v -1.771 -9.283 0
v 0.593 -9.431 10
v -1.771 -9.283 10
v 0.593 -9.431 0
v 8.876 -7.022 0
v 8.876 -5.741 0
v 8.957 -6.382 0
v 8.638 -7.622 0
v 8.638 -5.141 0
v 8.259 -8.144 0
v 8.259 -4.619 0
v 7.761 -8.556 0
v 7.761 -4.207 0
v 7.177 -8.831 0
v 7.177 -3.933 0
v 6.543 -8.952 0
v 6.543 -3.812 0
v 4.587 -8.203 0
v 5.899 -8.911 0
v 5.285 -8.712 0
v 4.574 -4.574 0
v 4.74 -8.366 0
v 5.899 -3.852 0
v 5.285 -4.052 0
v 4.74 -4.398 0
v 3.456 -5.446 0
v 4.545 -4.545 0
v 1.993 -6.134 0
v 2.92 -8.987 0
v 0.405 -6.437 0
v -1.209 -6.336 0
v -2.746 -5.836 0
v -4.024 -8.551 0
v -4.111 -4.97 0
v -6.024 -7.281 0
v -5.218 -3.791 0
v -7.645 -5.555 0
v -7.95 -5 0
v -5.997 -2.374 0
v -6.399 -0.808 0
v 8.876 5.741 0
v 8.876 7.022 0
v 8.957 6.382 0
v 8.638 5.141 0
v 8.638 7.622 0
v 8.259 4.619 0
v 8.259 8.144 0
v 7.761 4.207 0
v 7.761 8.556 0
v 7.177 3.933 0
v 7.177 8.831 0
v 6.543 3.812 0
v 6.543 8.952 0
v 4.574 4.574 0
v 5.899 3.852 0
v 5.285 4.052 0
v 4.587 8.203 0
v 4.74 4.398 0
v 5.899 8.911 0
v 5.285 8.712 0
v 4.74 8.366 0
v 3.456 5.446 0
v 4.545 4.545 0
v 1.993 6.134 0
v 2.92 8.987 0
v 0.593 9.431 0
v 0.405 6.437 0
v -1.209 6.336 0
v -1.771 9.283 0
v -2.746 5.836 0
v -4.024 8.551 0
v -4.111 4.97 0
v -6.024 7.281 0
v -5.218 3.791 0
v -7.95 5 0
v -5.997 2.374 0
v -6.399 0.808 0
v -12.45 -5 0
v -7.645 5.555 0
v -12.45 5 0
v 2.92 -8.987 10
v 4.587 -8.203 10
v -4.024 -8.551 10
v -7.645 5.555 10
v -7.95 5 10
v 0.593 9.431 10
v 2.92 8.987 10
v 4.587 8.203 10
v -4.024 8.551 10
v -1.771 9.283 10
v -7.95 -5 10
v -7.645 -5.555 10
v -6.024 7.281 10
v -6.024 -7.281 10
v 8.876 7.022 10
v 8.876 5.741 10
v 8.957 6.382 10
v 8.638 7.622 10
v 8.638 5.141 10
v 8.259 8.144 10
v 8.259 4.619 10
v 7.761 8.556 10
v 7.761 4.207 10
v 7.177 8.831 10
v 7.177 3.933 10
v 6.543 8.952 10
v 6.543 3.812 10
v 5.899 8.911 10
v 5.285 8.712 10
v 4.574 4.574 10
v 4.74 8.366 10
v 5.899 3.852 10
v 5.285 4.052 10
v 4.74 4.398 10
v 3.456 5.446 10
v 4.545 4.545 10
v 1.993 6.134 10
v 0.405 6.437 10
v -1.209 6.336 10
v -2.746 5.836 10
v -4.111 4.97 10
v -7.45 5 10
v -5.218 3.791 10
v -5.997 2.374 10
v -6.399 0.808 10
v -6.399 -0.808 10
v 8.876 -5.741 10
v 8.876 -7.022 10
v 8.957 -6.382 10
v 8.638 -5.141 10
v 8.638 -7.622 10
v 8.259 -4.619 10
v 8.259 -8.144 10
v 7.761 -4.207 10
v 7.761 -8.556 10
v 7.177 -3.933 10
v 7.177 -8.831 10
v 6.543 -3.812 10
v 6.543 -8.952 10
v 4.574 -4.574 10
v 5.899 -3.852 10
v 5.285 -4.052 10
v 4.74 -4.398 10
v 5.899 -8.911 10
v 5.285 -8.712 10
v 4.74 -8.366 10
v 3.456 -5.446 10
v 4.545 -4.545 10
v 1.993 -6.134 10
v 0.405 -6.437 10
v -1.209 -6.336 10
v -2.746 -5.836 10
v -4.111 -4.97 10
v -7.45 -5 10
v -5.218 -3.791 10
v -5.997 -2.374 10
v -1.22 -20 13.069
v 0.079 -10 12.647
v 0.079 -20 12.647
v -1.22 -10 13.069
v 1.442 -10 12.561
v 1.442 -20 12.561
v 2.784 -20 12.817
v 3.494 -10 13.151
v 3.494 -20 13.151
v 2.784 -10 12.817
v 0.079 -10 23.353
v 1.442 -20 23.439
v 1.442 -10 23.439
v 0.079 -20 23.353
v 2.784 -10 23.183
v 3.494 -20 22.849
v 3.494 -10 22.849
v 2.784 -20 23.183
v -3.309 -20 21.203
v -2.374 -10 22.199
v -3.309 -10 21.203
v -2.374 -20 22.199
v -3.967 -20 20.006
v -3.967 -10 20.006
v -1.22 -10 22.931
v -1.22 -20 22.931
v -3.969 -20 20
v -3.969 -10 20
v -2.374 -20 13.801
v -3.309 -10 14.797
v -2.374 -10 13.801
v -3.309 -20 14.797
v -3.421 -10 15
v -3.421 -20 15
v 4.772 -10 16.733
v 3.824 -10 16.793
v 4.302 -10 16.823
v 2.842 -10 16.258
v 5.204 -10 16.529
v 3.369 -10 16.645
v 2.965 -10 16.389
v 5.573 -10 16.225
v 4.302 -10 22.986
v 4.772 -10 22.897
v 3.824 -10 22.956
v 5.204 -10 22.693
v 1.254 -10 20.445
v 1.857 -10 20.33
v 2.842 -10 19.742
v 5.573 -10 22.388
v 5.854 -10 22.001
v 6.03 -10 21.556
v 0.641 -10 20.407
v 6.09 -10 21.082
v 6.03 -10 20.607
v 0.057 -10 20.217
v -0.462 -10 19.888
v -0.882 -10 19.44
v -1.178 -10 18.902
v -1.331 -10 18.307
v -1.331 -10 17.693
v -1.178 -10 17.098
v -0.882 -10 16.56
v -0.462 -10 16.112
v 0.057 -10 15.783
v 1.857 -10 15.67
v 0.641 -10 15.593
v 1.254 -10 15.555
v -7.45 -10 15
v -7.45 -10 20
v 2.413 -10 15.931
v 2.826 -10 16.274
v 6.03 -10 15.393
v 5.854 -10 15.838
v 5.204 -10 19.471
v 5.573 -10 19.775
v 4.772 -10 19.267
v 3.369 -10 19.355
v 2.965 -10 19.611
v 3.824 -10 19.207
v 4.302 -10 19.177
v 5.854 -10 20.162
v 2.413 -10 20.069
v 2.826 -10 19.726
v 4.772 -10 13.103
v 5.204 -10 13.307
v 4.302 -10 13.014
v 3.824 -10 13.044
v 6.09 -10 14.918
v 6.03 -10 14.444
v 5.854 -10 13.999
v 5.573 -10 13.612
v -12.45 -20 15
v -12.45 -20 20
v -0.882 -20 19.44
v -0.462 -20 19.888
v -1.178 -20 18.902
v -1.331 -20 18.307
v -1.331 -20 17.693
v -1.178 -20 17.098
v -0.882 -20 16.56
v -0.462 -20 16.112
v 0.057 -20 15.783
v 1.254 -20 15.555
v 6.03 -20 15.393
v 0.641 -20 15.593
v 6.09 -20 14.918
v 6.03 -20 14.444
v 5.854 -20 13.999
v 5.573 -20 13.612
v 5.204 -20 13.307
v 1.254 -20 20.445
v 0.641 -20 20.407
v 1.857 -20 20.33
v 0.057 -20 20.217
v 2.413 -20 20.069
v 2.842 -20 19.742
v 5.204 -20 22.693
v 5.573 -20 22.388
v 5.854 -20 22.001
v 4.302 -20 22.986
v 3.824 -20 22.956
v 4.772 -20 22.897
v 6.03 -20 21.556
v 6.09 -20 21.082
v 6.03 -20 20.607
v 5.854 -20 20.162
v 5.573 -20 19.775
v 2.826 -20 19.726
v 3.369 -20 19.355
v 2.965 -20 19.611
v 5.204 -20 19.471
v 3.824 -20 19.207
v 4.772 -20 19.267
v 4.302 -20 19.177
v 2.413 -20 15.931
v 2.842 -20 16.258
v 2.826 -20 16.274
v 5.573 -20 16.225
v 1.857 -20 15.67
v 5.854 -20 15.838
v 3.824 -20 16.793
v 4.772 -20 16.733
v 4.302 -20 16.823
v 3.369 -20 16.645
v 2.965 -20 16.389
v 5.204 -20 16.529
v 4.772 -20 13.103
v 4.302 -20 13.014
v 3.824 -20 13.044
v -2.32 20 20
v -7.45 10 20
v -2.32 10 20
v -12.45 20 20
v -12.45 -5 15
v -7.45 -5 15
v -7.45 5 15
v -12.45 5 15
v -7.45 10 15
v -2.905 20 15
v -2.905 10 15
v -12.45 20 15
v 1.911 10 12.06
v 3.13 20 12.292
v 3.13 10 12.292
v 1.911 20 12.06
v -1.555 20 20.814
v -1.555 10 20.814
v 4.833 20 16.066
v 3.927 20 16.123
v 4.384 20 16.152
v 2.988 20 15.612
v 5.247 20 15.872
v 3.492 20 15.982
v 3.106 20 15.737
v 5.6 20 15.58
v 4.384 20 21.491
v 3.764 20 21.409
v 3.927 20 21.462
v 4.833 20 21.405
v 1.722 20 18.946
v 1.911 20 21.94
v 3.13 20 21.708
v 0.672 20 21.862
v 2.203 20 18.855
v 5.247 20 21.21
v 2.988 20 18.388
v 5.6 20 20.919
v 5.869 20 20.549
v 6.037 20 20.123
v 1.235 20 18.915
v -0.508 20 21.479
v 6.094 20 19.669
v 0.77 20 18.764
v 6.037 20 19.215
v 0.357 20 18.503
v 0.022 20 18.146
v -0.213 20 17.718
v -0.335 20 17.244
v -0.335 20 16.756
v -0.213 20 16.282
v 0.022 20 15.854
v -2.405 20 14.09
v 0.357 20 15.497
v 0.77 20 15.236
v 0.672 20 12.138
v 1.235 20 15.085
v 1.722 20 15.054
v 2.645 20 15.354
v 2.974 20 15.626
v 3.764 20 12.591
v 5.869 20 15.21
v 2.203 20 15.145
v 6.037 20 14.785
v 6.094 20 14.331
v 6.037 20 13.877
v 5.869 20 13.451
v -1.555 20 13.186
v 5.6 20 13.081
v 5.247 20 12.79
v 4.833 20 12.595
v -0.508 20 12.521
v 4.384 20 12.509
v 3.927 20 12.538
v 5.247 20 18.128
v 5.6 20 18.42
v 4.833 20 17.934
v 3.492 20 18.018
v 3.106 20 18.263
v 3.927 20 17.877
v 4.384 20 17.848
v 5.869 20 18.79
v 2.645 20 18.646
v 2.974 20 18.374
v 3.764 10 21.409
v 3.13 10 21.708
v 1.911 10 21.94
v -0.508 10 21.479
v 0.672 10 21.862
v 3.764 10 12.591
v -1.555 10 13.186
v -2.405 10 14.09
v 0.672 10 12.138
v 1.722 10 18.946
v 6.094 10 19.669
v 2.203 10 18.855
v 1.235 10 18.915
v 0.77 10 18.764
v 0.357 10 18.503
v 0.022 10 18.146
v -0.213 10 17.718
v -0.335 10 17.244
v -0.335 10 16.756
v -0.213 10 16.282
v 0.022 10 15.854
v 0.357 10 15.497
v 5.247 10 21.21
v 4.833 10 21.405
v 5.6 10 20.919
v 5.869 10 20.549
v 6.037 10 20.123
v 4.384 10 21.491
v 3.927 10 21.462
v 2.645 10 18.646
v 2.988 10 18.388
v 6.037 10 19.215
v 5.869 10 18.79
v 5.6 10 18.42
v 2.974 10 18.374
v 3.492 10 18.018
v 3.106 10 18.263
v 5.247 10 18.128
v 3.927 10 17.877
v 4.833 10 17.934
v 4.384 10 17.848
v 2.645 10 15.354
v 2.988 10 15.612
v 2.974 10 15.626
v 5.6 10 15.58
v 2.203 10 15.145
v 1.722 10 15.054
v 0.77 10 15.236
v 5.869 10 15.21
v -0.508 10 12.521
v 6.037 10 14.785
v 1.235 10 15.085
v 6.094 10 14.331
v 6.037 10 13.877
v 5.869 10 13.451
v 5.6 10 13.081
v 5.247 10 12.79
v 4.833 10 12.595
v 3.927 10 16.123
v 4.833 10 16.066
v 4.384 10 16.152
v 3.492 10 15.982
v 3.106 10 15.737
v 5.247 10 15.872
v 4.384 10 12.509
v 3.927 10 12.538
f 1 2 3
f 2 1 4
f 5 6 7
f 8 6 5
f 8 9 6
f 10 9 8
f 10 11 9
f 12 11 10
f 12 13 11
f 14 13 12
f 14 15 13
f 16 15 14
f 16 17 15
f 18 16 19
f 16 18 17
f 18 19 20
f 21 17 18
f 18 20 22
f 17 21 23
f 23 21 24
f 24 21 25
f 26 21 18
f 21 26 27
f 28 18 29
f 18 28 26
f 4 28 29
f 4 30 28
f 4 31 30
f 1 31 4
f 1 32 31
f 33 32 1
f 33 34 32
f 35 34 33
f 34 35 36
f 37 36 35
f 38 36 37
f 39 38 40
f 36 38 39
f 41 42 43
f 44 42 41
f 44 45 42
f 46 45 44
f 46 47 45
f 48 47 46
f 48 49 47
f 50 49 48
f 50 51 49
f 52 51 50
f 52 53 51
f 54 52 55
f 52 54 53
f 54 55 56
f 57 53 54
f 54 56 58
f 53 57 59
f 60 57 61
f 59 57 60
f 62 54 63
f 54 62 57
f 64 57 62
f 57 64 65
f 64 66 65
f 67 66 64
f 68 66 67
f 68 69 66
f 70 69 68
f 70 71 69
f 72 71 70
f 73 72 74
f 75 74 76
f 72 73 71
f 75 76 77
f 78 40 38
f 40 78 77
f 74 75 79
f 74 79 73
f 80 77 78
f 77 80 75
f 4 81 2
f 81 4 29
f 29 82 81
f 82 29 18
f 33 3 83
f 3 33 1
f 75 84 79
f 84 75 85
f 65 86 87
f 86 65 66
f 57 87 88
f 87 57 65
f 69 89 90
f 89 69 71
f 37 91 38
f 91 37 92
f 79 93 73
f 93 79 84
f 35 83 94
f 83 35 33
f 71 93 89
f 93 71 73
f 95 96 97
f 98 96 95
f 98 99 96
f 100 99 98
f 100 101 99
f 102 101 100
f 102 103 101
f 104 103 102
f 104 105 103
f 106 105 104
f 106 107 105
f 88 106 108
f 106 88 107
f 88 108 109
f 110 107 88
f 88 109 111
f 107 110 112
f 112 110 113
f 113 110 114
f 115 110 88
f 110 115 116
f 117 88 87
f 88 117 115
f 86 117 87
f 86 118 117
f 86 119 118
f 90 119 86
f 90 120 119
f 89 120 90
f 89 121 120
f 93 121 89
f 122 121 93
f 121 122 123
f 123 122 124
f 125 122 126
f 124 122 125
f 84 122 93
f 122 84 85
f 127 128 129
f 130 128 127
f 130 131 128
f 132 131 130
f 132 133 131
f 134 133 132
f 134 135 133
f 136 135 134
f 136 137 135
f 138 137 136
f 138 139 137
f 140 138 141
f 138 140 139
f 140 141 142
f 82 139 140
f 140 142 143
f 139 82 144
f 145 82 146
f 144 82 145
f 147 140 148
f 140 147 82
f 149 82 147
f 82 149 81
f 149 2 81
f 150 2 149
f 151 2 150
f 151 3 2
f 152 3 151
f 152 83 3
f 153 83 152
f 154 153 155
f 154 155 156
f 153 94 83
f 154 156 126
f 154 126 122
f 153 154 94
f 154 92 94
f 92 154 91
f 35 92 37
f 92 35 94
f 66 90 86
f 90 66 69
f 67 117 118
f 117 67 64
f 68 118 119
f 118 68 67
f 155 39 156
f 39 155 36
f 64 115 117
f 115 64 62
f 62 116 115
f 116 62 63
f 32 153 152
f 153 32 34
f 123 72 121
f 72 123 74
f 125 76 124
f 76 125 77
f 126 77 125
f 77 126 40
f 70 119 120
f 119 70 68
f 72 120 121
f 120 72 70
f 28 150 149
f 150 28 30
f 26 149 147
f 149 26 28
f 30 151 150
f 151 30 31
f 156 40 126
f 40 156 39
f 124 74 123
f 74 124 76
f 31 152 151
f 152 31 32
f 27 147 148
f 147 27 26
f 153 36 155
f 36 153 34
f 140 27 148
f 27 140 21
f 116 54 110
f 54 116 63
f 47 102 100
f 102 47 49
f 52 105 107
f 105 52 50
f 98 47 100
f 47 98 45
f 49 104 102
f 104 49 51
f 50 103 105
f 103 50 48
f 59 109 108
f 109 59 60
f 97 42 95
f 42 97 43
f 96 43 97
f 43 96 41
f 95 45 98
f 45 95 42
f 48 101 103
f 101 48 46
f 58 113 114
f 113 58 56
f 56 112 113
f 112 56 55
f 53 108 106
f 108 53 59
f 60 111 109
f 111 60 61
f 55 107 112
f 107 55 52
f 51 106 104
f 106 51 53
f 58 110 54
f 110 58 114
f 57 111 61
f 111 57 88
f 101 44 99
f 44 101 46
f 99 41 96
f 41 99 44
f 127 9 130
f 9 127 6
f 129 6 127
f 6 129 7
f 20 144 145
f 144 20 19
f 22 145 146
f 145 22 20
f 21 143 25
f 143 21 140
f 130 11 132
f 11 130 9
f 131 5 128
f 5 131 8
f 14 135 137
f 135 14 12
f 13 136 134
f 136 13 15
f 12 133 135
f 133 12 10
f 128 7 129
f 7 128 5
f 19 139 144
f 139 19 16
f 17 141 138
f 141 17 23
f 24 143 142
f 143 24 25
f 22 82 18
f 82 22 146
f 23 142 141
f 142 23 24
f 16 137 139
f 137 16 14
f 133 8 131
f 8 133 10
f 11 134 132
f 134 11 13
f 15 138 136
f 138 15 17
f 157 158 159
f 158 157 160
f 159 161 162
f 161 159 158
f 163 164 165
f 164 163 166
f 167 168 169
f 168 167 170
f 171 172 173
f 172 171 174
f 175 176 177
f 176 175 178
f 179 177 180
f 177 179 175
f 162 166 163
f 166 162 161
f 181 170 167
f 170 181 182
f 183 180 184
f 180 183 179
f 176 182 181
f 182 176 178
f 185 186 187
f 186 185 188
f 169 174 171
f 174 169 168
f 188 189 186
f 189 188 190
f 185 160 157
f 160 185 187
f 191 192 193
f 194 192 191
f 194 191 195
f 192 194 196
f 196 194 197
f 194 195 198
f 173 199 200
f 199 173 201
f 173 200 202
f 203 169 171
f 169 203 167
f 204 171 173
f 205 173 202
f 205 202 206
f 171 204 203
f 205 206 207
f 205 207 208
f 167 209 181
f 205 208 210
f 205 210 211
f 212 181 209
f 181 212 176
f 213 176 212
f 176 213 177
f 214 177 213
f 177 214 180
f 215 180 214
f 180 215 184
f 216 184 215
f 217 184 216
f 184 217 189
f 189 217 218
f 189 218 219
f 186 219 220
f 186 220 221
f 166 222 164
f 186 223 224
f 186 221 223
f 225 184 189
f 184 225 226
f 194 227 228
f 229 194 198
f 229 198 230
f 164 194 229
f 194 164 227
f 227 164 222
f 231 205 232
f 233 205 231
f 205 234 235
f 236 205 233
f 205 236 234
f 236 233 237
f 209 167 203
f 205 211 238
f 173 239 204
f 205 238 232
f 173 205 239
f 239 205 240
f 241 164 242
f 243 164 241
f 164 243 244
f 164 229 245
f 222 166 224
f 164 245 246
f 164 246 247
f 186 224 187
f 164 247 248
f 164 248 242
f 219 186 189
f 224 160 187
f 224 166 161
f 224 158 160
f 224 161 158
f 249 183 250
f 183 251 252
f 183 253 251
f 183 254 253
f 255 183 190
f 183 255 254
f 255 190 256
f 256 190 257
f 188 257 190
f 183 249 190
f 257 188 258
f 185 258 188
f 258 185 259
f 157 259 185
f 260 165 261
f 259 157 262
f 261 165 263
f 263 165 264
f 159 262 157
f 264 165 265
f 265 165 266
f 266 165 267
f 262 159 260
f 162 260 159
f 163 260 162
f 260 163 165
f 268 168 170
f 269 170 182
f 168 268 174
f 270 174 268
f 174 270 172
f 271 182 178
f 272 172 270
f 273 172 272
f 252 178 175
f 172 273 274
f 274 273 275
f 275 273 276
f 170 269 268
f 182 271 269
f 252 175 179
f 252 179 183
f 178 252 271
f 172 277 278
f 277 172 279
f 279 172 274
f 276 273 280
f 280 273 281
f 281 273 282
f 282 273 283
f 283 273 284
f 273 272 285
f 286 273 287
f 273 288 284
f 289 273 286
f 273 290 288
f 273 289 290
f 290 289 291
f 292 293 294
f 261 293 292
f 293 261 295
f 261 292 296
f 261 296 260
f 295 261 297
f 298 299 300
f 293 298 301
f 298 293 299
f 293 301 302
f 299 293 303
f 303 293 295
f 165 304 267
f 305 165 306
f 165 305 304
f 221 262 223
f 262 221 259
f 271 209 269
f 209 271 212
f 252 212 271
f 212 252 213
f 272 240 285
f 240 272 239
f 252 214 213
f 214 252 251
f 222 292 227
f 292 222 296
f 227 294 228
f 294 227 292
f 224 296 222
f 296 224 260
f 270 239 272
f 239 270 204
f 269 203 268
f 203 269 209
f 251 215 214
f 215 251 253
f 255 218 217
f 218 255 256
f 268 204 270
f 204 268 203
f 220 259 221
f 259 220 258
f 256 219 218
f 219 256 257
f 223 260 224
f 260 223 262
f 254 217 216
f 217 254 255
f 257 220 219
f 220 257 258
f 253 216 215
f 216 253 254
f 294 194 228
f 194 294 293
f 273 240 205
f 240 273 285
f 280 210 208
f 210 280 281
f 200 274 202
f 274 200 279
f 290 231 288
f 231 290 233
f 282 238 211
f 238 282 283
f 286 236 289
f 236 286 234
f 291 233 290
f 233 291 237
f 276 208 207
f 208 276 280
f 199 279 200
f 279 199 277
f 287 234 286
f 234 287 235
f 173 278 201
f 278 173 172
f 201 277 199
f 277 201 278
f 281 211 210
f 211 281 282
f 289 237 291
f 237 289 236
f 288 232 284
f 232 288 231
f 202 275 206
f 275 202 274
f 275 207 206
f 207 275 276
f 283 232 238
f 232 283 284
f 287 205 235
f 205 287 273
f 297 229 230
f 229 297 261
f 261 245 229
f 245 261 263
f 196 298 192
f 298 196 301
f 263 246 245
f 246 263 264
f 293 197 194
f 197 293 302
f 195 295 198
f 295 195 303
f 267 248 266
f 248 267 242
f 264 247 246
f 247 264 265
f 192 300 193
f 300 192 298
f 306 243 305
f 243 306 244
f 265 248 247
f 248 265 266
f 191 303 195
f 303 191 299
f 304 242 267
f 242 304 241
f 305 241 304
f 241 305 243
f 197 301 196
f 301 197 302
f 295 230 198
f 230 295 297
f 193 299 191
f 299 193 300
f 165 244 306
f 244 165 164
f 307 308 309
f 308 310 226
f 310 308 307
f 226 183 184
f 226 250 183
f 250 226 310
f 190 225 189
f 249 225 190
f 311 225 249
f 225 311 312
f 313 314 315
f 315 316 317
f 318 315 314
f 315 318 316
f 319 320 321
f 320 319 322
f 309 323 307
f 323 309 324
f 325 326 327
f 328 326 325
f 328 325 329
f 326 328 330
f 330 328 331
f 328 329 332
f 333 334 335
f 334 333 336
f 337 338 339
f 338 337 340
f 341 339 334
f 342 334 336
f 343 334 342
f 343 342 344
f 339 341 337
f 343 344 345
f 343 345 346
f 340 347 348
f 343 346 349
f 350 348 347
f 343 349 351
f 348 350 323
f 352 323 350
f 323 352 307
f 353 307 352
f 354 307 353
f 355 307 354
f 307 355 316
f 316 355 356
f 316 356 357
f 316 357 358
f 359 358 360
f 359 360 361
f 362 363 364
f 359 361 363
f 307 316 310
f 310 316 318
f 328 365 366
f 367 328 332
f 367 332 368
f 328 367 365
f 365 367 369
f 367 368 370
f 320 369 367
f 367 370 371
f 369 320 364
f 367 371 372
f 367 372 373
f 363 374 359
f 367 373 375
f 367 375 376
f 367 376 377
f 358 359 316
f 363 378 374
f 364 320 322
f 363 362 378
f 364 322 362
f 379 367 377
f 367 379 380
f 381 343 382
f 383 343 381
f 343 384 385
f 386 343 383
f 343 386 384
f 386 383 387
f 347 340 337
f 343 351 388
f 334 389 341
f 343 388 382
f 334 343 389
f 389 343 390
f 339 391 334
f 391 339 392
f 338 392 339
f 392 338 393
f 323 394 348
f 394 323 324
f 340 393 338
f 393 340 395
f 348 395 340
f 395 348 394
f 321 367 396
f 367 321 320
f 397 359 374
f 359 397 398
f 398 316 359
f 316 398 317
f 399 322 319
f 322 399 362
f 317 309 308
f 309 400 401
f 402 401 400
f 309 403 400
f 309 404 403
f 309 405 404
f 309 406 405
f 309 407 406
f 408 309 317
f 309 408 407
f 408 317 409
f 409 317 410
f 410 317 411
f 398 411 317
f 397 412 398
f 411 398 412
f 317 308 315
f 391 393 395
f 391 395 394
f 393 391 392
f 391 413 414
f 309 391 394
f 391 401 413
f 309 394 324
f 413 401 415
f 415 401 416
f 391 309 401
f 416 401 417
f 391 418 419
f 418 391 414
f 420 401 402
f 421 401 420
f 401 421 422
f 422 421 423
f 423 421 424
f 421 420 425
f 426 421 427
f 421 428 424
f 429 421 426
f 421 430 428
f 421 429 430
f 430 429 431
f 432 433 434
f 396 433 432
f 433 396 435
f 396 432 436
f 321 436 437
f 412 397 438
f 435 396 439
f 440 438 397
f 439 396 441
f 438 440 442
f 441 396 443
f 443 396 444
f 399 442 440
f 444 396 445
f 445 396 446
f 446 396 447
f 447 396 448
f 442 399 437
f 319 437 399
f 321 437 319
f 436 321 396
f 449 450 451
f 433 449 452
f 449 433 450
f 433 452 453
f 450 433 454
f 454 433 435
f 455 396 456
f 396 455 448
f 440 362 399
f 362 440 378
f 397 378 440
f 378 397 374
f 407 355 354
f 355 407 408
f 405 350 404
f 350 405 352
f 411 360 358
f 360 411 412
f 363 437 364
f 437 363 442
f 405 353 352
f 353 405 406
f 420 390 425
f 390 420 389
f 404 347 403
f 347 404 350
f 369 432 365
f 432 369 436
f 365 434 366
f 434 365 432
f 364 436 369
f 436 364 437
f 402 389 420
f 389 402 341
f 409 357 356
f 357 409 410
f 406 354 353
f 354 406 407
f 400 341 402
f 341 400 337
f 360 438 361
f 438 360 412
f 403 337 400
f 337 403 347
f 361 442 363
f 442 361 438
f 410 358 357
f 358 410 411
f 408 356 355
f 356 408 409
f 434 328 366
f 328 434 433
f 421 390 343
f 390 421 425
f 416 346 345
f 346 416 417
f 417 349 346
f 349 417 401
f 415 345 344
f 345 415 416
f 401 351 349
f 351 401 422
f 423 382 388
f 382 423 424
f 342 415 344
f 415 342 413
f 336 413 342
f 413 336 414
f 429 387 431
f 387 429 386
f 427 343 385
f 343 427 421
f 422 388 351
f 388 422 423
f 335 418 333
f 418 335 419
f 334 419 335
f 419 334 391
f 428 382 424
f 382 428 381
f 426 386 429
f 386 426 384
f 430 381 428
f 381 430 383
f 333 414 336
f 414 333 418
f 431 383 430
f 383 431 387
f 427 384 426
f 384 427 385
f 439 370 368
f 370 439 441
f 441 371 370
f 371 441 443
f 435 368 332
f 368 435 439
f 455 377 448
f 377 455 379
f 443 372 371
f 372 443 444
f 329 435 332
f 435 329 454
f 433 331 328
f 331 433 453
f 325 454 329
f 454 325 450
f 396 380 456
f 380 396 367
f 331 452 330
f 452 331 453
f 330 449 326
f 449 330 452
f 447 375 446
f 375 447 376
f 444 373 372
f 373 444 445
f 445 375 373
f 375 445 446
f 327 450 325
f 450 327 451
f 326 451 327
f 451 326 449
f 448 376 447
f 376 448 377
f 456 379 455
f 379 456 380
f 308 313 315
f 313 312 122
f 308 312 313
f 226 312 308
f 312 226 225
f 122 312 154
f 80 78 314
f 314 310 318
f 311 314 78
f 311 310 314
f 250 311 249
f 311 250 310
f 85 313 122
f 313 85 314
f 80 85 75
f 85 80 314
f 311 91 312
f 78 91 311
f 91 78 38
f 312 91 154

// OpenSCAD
$fn = 25;

module gripper(r, thickness, opening_angle, height) {

d = r*2;

x_offset = (d + thickness*2) * cos(opening_angle);
y_offset = (d + thickness*2) * sin(opening_angle);


union() {
  difference() {
    cylinder(d = d + thickness*2, h = 10);
    cylinder(d = d, h = 30, center=true);
    linear_extrude(height = 30, center=true)
      polygon(points = [[0,0], [x_offset, y_offset], [x_offset, -y_offset]]);
  }

  end_extra_d = d/6;
  end_x = (d + thickness + end_extra_d)/2 * cos(opening_angle);
  end_y = (d + thickness + end_extra_d)/2 * sin(opening_angle);
  translate([end_x, end_y, 0]) cylinder(d = thickness + end_extra_d, h = 10);
  translate([end_x, -end_y, 0]) cylinder(d = thickness + end_extra_d, h = 10);
  }
}

main_shaft_d = 12.9; // 12.5 measured + radius 0.2 margin 
left_branch_d = 4.9;
right_branch_d = 3.9;

gripper(r=main_shaft_d / 2, thickness=3, opening_angle=45, height=10);
translate([-main_shaft_d/2 - 3 - 3, -5, 0]) cube([5,10,20]);
translate([-main_shaft_d/2 - 3 - 3, -20, 15]) cube([5,40,5]);

translate([-main_shaft_d/2 - left_branch_d/2 +5 +5, -10,18])
  rotate([90,0,0])
  union() {
    gripper(r=left_branch_d/2, thickness=3, opening_angle=45, height=5);
    translate([-left_branch_d*2+1,-3,0]) cube([5,5,10]);
  }

translate([-main_shaft_d/2 - right_branch_d/2 +5 +5, 20,17])
  rotate([90,0,0])
  union() {
  gripper(r=right_branch_d/2, thickness=3, opening_angle=45, height=5);
    translate([-right_branch_d*2-5,-2,0]) cube([10,5,10]);
    }
